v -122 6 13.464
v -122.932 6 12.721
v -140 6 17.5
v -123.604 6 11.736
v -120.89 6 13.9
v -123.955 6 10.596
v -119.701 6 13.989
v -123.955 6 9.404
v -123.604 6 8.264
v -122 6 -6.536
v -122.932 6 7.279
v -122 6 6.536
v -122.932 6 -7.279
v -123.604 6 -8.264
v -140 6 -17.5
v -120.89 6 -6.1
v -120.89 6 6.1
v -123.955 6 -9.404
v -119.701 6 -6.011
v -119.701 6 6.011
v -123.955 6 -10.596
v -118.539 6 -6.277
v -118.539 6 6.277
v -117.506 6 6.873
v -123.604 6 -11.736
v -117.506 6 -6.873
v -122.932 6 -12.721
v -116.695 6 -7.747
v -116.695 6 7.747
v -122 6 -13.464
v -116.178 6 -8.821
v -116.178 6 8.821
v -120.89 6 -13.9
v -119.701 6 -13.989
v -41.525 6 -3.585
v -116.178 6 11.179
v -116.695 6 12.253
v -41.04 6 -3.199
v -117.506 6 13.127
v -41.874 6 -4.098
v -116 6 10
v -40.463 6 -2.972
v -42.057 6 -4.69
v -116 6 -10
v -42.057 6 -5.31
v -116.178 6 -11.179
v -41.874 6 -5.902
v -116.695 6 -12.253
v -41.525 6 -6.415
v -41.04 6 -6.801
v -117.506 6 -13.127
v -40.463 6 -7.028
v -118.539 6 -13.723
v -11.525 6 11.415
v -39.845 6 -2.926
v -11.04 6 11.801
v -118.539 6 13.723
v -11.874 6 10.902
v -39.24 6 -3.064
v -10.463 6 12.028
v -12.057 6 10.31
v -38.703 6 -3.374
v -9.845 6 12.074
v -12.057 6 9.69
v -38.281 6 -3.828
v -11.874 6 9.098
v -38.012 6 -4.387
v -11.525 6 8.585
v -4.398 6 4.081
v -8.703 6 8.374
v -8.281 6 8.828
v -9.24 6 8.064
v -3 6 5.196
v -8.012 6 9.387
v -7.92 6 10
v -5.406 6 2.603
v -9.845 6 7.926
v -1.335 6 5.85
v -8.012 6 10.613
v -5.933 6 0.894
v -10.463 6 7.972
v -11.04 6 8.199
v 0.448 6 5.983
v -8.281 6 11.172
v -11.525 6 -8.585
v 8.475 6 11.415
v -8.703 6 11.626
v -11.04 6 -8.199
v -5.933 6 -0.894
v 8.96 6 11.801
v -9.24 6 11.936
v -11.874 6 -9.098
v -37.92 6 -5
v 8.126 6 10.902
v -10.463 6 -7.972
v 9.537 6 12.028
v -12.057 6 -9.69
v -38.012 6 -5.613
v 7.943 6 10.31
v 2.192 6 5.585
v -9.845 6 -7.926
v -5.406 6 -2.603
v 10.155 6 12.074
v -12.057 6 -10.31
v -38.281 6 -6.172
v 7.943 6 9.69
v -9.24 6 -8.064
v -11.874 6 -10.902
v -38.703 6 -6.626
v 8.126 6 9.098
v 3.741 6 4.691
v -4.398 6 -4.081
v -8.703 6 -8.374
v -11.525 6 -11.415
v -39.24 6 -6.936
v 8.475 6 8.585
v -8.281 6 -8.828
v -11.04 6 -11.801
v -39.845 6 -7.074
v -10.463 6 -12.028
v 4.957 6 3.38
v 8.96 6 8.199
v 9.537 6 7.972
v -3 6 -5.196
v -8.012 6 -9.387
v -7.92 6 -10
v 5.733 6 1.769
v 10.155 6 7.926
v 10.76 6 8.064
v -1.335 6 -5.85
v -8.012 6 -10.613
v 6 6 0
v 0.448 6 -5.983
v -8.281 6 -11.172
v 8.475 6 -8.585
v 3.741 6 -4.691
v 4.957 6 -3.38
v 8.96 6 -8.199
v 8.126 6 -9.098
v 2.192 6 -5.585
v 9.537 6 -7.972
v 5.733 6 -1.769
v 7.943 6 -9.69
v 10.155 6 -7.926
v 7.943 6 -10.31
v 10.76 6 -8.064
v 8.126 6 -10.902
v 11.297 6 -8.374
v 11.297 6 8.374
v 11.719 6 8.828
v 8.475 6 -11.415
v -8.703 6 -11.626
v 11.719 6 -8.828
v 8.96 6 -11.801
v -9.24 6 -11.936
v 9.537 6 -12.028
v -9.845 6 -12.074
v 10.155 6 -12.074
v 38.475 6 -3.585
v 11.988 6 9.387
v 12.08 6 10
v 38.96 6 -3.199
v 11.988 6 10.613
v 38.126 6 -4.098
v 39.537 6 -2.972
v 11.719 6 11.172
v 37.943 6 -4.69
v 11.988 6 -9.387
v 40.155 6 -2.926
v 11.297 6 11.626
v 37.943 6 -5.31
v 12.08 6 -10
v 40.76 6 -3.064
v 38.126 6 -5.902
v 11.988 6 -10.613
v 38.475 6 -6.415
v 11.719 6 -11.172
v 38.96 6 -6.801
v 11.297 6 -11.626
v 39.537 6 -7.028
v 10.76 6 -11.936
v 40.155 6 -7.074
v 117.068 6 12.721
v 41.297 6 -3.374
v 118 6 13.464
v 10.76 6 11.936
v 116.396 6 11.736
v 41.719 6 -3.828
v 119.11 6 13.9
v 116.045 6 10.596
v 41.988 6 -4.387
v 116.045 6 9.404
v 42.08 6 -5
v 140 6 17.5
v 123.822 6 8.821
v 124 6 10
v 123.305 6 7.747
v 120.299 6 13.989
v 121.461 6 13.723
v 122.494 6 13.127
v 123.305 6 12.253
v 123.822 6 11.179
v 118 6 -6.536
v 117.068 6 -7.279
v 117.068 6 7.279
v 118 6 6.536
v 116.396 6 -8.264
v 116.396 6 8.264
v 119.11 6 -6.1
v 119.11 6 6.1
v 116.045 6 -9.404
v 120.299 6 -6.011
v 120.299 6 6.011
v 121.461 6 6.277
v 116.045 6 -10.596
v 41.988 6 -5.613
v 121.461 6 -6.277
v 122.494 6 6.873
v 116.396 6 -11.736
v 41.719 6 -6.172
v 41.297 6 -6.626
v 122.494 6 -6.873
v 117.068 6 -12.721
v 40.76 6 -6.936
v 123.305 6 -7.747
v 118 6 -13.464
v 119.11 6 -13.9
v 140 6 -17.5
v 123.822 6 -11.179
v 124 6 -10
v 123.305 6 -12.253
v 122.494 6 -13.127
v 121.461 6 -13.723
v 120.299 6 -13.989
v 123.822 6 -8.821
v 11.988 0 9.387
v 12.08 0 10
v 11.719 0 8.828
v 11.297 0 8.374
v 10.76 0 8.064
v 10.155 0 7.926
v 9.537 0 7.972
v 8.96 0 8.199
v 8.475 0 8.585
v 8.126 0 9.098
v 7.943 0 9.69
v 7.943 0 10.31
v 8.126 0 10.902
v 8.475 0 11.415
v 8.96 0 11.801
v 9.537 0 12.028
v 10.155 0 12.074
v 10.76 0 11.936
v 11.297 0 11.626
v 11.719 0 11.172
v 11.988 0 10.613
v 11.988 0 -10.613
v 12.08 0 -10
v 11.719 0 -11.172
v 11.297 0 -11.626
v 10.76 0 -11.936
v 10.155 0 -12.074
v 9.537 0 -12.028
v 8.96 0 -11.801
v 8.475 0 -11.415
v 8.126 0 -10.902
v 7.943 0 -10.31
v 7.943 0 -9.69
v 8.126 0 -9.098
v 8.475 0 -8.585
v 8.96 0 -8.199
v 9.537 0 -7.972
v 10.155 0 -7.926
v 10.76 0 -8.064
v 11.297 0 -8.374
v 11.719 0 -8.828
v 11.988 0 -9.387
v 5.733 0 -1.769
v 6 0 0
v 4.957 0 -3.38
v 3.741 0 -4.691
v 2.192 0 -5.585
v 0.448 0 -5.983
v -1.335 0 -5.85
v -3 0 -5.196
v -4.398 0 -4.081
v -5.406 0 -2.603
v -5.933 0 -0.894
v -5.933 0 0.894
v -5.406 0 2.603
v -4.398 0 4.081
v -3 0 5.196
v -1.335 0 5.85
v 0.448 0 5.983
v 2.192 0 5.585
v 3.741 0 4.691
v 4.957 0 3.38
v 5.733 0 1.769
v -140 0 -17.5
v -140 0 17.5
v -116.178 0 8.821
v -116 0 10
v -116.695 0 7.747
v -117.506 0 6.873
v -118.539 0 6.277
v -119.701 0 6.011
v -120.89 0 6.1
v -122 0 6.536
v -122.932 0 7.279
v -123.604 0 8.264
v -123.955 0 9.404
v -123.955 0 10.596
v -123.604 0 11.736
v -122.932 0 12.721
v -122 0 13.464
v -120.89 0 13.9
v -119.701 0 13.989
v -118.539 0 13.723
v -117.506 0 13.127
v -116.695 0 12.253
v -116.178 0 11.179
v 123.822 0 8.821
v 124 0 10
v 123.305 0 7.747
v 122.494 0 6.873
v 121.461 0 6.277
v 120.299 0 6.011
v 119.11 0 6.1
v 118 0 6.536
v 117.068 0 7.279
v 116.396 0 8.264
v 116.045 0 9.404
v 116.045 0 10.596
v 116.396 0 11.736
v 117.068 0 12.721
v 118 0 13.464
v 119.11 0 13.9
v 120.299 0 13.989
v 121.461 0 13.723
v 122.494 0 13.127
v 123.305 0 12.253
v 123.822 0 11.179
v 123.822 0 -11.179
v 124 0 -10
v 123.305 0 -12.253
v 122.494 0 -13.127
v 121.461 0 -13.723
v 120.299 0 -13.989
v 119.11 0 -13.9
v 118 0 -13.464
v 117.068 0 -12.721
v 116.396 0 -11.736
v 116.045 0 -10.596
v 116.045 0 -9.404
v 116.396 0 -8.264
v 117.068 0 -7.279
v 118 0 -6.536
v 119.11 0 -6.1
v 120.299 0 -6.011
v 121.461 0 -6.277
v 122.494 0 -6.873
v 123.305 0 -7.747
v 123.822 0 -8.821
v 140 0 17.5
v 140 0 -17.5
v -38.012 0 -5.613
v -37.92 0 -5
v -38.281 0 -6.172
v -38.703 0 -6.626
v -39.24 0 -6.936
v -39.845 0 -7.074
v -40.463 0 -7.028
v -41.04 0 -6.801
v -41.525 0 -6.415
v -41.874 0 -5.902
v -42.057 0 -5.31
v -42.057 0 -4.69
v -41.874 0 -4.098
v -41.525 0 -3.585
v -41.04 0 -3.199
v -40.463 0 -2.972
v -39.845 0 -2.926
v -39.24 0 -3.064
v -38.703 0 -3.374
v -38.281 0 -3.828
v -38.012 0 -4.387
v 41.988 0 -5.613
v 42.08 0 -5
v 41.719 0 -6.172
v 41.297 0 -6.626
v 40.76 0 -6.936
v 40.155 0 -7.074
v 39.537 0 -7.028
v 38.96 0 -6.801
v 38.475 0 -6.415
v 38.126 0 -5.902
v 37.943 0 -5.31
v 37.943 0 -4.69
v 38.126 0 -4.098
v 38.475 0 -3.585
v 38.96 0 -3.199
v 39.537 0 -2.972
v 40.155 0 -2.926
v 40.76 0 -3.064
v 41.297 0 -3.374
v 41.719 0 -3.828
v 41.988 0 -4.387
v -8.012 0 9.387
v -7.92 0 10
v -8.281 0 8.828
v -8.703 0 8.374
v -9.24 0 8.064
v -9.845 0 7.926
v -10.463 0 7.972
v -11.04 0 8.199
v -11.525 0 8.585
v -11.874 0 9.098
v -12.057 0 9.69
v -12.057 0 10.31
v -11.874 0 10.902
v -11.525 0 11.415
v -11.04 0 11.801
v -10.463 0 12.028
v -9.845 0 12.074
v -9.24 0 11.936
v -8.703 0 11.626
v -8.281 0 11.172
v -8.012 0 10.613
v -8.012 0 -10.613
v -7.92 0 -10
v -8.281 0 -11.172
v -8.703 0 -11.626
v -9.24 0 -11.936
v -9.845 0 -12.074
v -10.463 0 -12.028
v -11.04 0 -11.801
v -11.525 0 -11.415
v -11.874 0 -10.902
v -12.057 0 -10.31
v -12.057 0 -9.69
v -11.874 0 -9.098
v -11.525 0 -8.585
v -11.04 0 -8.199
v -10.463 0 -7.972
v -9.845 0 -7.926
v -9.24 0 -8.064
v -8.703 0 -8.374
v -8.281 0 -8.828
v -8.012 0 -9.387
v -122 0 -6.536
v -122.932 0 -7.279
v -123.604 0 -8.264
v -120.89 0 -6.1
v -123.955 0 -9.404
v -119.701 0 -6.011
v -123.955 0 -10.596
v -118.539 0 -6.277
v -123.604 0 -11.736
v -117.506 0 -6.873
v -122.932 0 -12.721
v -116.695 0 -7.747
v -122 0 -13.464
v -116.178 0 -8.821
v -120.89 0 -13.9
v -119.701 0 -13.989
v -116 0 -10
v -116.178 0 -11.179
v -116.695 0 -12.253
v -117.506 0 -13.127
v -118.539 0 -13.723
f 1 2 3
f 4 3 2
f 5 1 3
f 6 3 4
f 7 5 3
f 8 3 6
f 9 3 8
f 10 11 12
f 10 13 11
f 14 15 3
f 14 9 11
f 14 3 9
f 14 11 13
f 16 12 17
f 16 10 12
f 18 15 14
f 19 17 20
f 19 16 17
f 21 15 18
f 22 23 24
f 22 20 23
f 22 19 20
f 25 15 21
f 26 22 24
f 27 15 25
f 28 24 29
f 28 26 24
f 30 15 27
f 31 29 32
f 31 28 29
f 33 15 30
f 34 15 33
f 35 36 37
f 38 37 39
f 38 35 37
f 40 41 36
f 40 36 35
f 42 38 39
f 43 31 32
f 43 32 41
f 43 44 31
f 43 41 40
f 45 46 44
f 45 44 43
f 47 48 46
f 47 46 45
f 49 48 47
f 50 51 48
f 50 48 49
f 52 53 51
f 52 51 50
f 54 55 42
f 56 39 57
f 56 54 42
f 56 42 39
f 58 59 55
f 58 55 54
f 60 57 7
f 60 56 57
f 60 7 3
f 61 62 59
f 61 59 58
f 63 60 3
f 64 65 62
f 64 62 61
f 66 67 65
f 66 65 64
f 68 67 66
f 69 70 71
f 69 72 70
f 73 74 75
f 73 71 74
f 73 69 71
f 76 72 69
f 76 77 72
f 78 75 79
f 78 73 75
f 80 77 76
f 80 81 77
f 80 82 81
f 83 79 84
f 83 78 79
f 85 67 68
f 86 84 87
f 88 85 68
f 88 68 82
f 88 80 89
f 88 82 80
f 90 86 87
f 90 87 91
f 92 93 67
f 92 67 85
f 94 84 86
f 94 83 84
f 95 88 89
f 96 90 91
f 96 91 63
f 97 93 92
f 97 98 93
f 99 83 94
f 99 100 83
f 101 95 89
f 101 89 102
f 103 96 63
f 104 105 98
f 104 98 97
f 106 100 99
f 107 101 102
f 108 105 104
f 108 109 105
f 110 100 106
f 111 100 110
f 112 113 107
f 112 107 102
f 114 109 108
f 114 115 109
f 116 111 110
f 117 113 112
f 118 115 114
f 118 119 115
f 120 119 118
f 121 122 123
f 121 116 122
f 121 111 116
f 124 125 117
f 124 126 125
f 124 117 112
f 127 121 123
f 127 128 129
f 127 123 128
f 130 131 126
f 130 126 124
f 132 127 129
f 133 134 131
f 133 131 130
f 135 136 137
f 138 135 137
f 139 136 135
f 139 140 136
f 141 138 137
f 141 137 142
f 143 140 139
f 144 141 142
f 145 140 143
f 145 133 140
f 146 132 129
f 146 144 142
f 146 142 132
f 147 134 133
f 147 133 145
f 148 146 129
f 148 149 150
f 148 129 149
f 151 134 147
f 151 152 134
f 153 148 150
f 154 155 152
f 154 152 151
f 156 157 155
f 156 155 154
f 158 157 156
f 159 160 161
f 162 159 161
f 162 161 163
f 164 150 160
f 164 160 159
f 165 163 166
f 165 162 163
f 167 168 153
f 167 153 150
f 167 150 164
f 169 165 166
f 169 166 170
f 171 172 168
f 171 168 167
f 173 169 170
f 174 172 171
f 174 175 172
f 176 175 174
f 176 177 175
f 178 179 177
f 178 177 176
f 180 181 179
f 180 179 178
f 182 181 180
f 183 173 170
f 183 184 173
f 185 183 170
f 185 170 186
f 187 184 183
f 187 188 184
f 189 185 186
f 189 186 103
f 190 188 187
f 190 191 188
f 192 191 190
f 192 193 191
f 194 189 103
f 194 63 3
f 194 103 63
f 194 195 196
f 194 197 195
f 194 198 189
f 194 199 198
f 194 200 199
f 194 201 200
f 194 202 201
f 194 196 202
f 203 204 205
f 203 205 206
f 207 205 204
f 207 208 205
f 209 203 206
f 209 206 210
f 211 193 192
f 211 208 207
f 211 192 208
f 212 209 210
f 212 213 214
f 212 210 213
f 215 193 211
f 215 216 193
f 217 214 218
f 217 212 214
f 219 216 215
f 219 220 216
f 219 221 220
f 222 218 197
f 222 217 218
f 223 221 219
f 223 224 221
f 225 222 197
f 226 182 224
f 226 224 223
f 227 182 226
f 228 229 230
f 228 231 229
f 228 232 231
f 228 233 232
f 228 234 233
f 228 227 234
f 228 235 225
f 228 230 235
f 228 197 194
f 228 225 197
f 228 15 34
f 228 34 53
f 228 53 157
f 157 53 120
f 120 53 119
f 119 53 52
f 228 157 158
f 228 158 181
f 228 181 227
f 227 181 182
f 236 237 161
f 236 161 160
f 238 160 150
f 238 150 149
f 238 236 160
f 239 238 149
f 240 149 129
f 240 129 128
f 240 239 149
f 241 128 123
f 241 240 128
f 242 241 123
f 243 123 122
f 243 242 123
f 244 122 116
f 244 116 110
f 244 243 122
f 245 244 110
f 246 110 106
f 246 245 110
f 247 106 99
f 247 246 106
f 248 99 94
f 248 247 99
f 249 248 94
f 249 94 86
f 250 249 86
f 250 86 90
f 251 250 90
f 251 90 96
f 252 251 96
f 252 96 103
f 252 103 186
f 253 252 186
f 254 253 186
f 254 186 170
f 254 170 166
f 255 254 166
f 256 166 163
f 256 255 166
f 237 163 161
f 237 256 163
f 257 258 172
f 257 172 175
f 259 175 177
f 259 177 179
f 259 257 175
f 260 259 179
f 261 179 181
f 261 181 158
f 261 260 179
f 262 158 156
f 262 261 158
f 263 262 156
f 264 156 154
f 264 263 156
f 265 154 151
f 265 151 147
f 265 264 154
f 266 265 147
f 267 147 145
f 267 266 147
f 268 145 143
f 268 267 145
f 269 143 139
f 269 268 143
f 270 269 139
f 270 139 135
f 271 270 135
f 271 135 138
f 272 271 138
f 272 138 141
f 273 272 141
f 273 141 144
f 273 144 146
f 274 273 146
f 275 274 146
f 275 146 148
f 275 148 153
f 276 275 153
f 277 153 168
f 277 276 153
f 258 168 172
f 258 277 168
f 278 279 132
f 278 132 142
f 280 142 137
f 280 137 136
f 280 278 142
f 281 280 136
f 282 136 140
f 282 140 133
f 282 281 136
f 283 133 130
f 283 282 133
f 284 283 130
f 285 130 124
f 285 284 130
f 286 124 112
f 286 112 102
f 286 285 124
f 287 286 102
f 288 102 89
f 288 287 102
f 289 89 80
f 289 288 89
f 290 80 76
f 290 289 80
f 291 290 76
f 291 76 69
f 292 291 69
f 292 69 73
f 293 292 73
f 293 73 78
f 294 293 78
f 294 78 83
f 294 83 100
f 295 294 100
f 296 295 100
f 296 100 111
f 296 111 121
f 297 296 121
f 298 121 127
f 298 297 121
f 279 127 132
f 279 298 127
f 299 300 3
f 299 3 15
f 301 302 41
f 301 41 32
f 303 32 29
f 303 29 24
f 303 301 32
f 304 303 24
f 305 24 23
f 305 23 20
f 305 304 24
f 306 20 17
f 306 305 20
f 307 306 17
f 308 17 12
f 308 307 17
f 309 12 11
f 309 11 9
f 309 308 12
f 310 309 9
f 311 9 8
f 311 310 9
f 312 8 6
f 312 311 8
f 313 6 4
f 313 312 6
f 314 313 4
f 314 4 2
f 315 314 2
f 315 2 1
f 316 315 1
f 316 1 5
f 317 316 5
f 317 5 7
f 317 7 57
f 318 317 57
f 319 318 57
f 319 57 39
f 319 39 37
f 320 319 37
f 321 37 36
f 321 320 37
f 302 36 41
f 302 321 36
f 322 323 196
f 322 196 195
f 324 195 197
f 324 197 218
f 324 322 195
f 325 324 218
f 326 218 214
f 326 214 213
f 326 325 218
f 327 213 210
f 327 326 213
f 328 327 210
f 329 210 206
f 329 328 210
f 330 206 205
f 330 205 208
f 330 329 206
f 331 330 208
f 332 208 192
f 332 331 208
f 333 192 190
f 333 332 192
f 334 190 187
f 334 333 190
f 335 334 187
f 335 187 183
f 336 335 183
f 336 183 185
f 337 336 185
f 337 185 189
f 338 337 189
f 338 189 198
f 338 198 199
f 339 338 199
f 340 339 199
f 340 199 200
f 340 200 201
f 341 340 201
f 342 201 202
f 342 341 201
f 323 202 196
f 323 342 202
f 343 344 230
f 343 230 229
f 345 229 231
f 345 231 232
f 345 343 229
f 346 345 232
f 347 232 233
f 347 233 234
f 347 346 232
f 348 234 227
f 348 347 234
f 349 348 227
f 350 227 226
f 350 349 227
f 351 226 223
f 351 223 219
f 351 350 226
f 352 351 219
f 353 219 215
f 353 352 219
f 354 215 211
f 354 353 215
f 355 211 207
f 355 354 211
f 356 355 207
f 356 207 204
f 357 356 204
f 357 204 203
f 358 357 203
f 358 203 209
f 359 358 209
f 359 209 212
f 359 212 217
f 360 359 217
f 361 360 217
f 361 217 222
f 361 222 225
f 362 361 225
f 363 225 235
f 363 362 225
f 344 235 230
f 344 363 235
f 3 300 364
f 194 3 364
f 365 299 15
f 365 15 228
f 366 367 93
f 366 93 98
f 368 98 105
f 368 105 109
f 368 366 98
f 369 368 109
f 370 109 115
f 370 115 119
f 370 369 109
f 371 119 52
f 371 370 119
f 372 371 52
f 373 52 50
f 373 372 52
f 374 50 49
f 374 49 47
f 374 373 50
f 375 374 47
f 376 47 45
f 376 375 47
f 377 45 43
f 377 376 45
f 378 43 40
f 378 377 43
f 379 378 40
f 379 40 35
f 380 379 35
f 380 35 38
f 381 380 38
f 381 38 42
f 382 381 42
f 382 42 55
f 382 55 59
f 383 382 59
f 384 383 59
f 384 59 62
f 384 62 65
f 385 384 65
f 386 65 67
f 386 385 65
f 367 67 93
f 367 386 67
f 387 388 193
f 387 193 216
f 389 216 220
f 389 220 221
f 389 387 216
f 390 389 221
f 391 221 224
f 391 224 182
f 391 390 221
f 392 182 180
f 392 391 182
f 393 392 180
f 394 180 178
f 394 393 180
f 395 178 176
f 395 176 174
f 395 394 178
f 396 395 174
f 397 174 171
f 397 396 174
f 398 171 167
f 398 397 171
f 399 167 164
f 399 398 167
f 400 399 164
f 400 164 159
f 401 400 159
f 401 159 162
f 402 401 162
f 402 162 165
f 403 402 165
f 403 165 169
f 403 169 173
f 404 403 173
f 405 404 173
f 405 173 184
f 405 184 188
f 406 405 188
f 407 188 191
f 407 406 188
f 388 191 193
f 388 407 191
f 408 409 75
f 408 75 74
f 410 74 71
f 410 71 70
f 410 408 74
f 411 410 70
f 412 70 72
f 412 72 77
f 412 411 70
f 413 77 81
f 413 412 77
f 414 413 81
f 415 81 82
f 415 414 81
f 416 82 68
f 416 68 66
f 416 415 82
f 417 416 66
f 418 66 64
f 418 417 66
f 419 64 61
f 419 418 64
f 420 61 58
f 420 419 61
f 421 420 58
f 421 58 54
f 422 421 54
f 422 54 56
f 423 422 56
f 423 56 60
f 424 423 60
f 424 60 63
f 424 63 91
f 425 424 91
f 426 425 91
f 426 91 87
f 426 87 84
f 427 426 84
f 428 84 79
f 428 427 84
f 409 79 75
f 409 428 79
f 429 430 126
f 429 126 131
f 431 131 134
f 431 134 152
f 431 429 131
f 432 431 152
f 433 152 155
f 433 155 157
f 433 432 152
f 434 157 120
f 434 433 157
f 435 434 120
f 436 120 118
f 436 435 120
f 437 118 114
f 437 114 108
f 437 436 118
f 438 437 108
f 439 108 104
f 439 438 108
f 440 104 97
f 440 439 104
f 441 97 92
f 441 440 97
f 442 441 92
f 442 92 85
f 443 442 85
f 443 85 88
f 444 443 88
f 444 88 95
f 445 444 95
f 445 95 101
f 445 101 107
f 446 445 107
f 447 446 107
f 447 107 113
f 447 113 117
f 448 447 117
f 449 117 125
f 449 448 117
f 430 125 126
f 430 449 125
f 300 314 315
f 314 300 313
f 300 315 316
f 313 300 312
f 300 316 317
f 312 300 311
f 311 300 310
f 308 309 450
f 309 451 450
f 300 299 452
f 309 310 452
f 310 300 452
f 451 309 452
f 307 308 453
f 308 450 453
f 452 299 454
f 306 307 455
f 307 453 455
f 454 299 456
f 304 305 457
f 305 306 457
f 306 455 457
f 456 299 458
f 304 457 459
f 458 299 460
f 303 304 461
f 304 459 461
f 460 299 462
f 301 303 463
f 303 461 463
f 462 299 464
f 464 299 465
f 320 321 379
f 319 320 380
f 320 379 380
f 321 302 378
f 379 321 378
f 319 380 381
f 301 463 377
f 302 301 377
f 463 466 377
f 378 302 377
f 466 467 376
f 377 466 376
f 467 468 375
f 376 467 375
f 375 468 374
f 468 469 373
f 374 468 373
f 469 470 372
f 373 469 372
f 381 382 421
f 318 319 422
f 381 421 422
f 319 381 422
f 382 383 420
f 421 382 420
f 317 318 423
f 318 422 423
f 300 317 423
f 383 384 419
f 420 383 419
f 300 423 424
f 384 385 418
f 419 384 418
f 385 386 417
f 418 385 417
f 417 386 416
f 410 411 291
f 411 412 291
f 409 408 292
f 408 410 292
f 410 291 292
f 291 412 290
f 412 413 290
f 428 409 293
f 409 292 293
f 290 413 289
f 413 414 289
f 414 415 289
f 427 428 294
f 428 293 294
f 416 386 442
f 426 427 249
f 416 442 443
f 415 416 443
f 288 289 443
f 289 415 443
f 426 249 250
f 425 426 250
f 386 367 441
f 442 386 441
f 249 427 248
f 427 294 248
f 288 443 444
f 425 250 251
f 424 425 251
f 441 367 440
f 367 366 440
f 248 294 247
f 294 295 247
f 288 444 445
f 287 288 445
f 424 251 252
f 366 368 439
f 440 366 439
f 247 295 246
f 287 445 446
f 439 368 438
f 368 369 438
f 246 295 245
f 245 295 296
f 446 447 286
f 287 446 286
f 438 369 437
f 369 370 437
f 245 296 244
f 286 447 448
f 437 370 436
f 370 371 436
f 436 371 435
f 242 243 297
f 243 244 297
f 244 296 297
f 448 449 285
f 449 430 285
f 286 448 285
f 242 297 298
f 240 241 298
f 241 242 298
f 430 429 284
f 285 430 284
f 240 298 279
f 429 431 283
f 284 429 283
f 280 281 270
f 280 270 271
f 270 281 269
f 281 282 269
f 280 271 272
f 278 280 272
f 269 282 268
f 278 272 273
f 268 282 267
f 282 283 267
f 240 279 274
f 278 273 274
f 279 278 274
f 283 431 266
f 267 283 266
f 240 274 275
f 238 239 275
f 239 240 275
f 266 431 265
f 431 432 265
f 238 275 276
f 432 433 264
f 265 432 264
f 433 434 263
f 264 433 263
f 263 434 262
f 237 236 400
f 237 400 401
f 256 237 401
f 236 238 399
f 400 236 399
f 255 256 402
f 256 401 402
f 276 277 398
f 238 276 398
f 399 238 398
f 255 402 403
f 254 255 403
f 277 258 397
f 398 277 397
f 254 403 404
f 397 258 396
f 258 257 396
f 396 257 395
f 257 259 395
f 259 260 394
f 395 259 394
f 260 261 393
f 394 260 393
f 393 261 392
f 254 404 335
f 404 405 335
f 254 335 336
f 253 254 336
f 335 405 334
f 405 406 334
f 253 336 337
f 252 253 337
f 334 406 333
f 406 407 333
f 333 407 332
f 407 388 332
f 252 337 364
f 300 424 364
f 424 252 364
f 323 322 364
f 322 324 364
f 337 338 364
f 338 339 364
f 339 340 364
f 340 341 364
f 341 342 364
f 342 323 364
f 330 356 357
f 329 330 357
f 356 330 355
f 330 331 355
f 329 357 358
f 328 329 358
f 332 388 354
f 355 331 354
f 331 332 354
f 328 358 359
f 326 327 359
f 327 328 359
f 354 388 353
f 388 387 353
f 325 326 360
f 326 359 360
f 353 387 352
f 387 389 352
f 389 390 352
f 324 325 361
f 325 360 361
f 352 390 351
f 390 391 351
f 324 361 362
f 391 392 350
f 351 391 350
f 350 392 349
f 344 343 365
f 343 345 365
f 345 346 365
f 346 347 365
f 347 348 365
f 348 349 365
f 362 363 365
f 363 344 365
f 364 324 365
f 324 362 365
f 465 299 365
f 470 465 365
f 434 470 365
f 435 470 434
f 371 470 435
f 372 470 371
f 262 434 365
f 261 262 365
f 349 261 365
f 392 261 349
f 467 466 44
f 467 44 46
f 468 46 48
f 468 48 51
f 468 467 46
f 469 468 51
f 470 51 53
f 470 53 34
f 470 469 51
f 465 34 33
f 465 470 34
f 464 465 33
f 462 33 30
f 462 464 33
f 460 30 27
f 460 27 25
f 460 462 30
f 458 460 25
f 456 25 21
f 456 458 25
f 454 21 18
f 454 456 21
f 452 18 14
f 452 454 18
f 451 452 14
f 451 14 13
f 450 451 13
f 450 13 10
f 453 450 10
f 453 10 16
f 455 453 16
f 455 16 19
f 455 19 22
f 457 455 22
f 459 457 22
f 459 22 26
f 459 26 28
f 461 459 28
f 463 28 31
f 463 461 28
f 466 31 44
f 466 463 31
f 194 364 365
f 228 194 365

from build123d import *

# Parameters (mm, degrees)
SKETCH1_W           = 280
SKETCH1_H           = 35
SKETCH1_R           = 2.08
SKETCH1_R_2         = 6
SKETCH1_R_3         = 4
BOSS_EXTRUDE1_DEPTH = 6


with BuildPart() as part:
    # Sketch1 → Boss-Extrude1 (new body)
    with BuildSketch(Plane(origin=(0, 0, 0), x_dir=(1, 0, 0), z_dir=(0, 1, 0))):
        Rectangle(SKETCH1_W, SKETCH1_H)
        with Locations((40, 5)):
            Circle(SKETCH1_R, mode=Mode.SUBTRACT)
        with Locations((-40, 5)):
            Circle(SKETCH1_R, mode=Mode.SUBTRACT)
        Circle(SKETCH1_R_2, mode=Mode.SUBTRACT)
        with Locations((10, 10)):
            Circle(SKETCH1_R, mode=Mode.SUBTRACT)
        with Locations((-10, 10)):
            Circle(SKETCH1_R, mode=Mode.SUBTRACT)
        with Locations((-10, -10)):
            Circle(SKETCH1_R, mode=Mode.SUBTRACT)
        with Locations((10, -10)):
            Circle(SKETCH1_R, mode=Mode.SUBTRACT)
        with Locations((120, 10)):
            Circle(SKETCH1_R_3, mode=Mode.SUBTRACT)
        with Locations((-120, 10)):
            Circle(SKETCH1_R_3, mode=Mode.SUBTRACT)
        with Locations((120, -10)):
            Circle(SKETCH1_R_3, mode=Mode.SUBTRACT)
        with Locations((-120, -10)):
            Circle(SKETCH1_R_3, mode=Mode.SUBTRACT)
    extrude(amount=BOSS_EXTRUDE1_DEPTH)


solid = part.part
